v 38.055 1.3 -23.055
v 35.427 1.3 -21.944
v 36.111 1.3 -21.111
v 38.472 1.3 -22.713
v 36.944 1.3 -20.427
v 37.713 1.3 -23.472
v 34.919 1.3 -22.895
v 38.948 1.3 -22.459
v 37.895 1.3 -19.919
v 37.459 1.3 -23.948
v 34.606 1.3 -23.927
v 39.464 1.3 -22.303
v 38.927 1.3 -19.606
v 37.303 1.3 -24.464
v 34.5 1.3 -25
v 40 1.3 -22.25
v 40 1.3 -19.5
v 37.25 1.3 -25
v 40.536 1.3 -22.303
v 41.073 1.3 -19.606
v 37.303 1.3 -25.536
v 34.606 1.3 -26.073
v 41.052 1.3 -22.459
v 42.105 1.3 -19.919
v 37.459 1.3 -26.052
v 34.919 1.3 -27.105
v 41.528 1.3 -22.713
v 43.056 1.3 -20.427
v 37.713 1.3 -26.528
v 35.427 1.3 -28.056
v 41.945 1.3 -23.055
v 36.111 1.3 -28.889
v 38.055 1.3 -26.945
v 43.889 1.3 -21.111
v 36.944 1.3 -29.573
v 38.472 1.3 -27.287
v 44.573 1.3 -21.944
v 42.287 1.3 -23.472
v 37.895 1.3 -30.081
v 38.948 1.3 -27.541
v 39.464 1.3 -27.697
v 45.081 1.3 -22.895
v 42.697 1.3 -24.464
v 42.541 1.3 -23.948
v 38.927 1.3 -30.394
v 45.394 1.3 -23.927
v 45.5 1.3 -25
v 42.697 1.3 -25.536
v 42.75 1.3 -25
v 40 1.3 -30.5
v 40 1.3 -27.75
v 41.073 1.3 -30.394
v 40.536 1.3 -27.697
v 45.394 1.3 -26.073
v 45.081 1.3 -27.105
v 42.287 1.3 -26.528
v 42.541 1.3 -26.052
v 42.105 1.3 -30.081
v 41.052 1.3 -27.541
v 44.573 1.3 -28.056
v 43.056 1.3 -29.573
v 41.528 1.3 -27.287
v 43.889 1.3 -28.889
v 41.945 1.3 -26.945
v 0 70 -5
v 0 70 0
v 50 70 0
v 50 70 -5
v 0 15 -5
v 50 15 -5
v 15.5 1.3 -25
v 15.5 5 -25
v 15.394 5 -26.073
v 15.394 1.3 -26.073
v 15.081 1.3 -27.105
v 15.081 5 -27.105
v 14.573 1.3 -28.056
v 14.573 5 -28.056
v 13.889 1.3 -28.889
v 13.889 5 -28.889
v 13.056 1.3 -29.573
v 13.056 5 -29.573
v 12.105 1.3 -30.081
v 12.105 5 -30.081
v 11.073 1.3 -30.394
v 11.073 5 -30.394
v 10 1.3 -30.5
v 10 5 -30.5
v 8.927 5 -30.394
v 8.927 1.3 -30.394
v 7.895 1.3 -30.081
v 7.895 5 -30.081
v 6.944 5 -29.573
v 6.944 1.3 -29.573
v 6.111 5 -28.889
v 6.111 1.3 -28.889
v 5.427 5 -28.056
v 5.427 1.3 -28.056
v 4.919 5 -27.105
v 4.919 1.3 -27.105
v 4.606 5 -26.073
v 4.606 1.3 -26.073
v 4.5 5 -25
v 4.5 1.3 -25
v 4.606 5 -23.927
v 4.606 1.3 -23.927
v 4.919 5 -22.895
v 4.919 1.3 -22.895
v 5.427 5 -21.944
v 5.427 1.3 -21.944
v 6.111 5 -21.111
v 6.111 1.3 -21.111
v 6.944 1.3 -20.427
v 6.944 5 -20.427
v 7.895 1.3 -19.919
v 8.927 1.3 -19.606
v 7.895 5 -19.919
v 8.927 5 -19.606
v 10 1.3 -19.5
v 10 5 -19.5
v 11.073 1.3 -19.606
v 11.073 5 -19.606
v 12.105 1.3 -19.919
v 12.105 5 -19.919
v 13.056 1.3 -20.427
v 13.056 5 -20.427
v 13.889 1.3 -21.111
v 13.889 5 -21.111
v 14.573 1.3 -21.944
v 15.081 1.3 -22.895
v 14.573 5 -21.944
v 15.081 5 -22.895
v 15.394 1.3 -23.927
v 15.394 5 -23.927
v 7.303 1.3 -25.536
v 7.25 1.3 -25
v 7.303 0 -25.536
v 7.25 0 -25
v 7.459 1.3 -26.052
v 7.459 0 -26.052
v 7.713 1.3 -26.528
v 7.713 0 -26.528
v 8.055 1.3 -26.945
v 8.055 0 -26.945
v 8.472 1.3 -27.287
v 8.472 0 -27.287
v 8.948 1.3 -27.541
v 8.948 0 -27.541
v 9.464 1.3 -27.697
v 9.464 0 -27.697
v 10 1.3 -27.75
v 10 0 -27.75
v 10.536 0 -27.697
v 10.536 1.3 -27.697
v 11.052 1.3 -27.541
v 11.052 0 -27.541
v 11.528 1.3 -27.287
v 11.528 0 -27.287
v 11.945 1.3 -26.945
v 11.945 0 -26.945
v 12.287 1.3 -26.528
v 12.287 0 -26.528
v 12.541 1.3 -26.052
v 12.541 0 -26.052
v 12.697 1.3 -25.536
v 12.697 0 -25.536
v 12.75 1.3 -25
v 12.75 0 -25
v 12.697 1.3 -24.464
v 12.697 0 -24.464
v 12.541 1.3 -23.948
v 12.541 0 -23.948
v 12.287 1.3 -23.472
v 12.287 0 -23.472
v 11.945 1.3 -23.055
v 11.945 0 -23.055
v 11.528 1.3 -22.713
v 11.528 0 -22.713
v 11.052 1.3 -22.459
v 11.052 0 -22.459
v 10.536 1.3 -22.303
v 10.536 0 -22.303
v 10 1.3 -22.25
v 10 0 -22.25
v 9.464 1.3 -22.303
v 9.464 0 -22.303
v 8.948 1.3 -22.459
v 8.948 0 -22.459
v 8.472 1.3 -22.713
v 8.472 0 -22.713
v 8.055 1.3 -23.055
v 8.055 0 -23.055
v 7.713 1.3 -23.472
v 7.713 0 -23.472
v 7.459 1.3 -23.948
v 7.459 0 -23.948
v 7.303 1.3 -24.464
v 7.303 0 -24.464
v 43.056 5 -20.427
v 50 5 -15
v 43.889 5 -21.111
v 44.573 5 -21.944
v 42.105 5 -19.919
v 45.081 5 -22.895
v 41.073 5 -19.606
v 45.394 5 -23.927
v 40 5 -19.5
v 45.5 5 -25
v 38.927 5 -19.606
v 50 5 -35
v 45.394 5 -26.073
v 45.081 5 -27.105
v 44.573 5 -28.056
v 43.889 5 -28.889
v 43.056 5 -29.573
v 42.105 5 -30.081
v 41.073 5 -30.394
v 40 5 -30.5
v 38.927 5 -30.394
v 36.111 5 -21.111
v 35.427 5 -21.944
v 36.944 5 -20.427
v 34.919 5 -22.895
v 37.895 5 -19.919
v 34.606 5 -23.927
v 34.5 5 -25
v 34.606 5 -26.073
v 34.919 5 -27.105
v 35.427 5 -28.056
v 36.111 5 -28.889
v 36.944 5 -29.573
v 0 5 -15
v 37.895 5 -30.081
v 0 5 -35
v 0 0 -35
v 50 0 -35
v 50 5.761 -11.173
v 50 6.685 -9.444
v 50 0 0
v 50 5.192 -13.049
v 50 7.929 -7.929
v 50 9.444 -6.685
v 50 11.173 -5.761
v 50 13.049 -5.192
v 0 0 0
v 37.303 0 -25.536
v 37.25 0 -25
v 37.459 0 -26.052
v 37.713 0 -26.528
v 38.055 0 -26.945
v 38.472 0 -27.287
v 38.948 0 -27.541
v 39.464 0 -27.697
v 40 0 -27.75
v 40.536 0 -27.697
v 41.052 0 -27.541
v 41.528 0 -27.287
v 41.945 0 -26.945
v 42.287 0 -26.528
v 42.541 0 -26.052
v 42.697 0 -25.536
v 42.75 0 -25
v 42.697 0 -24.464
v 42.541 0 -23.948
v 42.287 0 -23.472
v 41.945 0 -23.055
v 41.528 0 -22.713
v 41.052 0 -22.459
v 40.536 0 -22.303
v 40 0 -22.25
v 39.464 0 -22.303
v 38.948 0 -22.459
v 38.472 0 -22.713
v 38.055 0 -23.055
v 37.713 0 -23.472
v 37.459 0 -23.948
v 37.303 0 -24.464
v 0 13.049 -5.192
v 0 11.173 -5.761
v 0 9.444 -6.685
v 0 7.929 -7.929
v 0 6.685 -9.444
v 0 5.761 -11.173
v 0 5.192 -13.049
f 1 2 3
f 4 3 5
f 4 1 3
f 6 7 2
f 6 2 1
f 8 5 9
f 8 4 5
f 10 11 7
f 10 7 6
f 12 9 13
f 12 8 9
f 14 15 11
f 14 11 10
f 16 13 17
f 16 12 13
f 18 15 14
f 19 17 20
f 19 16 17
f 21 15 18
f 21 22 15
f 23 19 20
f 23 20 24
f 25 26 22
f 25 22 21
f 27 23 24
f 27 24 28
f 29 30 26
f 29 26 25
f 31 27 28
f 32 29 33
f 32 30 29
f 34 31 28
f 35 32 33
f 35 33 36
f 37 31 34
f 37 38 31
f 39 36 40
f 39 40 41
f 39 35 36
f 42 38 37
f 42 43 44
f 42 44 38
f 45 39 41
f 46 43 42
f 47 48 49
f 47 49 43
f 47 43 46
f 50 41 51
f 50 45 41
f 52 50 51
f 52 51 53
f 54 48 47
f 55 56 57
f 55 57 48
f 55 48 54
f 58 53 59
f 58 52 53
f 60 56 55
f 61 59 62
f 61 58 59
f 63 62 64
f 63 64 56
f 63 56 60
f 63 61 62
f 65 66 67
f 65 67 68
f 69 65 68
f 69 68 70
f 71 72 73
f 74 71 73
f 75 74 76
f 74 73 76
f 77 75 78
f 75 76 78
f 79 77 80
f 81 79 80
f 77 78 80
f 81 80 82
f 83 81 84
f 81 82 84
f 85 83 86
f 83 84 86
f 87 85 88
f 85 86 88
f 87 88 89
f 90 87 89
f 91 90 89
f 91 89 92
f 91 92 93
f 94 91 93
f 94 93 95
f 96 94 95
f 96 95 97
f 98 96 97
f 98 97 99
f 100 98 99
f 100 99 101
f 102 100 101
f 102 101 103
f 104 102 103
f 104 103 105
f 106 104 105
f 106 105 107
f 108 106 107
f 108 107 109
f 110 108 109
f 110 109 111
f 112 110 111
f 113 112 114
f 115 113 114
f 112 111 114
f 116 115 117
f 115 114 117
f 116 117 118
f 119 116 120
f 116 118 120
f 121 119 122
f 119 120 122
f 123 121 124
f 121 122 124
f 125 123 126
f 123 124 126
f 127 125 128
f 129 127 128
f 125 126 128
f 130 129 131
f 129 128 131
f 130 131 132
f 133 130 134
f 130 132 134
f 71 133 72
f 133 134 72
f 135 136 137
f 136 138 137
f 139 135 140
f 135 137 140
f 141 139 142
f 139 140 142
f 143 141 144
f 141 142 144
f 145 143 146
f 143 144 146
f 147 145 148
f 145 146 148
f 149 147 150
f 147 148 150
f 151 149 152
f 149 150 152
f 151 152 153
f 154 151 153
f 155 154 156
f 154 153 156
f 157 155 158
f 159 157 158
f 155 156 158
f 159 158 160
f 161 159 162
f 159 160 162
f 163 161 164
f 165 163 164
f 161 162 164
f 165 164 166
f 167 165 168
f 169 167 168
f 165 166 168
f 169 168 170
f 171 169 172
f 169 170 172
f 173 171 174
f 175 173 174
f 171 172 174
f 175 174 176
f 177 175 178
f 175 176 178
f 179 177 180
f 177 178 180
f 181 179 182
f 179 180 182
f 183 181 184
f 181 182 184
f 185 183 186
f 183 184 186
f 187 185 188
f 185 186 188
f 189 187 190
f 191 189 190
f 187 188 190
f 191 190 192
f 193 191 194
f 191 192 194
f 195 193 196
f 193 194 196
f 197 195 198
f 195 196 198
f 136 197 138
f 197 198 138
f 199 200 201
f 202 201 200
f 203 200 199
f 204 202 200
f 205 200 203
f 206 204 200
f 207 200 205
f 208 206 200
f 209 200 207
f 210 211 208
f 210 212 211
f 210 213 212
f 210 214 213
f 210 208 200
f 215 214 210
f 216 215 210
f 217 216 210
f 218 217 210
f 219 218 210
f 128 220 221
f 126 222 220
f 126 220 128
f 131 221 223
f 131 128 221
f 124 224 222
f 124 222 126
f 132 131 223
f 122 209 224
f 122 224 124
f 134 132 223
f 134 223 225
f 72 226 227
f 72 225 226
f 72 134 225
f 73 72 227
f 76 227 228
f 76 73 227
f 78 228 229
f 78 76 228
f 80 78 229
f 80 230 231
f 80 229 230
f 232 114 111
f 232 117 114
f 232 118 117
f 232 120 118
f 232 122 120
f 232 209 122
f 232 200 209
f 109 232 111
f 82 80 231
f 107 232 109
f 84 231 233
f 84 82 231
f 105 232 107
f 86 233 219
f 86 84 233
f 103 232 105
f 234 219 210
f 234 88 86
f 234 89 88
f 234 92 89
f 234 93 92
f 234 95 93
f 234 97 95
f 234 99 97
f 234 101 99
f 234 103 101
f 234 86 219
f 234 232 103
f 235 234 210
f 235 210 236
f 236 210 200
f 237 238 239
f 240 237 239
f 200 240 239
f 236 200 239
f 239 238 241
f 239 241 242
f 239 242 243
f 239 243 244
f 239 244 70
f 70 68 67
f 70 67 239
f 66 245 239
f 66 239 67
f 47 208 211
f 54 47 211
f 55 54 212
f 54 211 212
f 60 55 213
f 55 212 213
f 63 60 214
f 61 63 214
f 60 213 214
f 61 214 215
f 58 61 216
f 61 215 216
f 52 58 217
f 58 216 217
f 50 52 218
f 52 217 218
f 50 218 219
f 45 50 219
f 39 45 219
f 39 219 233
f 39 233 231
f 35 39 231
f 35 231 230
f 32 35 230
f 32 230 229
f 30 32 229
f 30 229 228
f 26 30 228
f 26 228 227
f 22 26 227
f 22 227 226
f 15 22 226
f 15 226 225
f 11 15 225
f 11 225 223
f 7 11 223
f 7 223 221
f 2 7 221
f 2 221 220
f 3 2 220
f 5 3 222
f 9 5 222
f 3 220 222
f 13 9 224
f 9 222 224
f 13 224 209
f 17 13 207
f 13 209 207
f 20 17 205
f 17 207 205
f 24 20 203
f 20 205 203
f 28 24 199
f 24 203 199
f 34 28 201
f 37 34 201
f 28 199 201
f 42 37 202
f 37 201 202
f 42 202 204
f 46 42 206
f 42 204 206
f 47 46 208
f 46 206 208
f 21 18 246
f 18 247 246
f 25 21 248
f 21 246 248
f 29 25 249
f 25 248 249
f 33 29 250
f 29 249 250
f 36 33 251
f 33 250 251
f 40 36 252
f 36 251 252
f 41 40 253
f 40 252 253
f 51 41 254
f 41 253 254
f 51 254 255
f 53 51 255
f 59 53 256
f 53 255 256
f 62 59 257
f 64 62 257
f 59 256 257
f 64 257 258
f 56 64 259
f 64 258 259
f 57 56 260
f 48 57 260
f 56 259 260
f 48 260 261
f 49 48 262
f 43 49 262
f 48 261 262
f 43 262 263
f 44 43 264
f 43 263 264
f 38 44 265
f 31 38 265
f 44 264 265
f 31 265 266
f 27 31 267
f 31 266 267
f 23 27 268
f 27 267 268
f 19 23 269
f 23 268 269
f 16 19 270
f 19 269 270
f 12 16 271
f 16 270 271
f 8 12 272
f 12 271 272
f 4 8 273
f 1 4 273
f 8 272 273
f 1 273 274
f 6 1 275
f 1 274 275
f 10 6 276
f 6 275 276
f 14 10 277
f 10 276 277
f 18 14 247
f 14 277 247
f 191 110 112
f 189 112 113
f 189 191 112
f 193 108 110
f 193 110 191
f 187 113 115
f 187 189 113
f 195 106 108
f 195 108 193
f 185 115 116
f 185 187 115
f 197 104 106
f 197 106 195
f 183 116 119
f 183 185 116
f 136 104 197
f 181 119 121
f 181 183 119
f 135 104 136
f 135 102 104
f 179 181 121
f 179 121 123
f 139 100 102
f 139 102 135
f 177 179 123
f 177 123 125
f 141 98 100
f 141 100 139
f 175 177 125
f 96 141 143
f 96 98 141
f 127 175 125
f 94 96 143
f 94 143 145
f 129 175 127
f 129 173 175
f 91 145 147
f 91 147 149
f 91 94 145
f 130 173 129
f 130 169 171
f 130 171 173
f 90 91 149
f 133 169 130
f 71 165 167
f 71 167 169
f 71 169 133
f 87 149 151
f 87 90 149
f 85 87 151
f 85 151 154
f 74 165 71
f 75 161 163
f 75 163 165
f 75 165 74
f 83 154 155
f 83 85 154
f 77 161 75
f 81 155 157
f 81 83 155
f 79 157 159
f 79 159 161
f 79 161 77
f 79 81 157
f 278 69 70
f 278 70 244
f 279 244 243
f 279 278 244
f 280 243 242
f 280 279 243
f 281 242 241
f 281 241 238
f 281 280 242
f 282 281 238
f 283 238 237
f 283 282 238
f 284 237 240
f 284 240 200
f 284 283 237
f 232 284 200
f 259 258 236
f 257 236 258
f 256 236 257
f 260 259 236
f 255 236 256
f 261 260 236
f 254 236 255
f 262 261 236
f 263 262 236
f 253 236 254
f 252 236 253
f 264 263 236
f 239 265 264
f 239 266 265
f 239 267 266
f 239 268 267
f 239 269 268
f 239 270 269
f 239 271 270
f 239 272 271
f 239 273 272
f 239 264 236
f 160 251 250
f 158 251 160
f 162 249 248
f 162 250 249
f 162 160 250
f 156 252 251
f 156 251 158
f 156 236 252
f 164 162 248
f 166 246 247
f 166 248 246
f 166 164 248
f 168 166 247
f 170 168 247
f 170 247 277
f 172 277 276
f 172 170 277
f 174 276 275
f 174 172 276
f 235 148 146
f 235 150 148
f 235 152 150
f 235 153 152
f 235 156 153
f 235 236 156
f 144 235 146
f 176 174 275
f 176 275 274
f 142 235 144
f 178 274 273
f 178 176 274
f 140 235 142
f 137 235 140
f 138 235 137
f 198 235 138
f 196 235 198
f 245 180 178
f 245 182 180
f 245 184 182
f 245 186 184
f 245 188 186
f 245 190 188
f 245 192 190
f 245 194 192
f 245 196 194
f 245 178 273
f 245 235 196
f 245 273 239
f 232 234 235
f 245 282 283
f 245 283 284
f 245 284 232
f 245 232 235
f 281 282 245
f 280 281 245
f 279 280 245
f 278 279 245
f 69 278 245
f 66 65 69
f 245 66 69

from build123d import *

# Parameters (mm, degrees)
BOSS_EXTRUDE1_DEPTH                      = 50
CBORE_FOR_M5_PAN_HEAD_SCREW1_D           = 5.5
CBORE_FOR_M5_PAN_HEAD_SCREW1_DEPTH       = 30
CBORE_FOR_M5_PAN_HEAD_SCREW1_CBORE_D     = 11
CBORE_FOR_M5_PAN_HEAD_SCREW1_CBORE_DEPTH = 3.7
CBORE_FOR_M5_PAN_HEAD_SCREW1_TIP         = 1.652366702


with BuildPart() as part:
    # Sketch2 → Boss-Extrude1 (new body)
    with BuildSketch(Plane(origin=(0, 0, 0), x_dir=(0, 0, -1), z_dir=(1, 0, 0))):
        with BuildLine():
            Line((0, 0), (0, 70))
            Line((0, 70), (5, 70))
            Line((5, 70), (5, 15))
            ThreePointArc((5, 15), (7.928932188, 7.928932188), (15, 5))
            Line((15, 5), (35, 5))
            Line((35, 5), (35, 0))
            Line((35, 0), (0, 0))
        make_face()
    extrude(amount=BOSS_EXTRUDE1_DEPTH)

    # CBORE for M5 Pan Head Screw1
    with Locations(Plane(origin=(0, 5, 0), x_dir=(1, 0, 0), z_dir=(0, 1, 0))):
        with Locations((40, 25), (10, 25)):
            CounterBoreHole(CBORE_FOR_M5_PAN_HEAD_SCREW1_D / 2, CBORE_FOR_M5_PAN_HEAD_SCREW1_CBORE_D / 2, CBORE_FOR_M5_PAN_HEAD_SCREW1_CBORE_DEPTH, depth=CBORE_FOR_M5_PAN_HEAD_SCREW1_DEPTH)
            with Locations((0, 0, -(CBORE_FOR_M5_PAN_HEAD_SCREW1_DEPTH + CBORE_FOR_M5_PAN_HEAD_SCREW1_TIP / 2))):  # 118° drill point
                Cone(0, CBORE_FOR_M5_PAN_HEAD_SCREW1_D / 2, CBORE_FOR_M5_PAN_HEAD_SCREW1_TIP, mode=Mode.SUBTRACT)


solid = part.part
